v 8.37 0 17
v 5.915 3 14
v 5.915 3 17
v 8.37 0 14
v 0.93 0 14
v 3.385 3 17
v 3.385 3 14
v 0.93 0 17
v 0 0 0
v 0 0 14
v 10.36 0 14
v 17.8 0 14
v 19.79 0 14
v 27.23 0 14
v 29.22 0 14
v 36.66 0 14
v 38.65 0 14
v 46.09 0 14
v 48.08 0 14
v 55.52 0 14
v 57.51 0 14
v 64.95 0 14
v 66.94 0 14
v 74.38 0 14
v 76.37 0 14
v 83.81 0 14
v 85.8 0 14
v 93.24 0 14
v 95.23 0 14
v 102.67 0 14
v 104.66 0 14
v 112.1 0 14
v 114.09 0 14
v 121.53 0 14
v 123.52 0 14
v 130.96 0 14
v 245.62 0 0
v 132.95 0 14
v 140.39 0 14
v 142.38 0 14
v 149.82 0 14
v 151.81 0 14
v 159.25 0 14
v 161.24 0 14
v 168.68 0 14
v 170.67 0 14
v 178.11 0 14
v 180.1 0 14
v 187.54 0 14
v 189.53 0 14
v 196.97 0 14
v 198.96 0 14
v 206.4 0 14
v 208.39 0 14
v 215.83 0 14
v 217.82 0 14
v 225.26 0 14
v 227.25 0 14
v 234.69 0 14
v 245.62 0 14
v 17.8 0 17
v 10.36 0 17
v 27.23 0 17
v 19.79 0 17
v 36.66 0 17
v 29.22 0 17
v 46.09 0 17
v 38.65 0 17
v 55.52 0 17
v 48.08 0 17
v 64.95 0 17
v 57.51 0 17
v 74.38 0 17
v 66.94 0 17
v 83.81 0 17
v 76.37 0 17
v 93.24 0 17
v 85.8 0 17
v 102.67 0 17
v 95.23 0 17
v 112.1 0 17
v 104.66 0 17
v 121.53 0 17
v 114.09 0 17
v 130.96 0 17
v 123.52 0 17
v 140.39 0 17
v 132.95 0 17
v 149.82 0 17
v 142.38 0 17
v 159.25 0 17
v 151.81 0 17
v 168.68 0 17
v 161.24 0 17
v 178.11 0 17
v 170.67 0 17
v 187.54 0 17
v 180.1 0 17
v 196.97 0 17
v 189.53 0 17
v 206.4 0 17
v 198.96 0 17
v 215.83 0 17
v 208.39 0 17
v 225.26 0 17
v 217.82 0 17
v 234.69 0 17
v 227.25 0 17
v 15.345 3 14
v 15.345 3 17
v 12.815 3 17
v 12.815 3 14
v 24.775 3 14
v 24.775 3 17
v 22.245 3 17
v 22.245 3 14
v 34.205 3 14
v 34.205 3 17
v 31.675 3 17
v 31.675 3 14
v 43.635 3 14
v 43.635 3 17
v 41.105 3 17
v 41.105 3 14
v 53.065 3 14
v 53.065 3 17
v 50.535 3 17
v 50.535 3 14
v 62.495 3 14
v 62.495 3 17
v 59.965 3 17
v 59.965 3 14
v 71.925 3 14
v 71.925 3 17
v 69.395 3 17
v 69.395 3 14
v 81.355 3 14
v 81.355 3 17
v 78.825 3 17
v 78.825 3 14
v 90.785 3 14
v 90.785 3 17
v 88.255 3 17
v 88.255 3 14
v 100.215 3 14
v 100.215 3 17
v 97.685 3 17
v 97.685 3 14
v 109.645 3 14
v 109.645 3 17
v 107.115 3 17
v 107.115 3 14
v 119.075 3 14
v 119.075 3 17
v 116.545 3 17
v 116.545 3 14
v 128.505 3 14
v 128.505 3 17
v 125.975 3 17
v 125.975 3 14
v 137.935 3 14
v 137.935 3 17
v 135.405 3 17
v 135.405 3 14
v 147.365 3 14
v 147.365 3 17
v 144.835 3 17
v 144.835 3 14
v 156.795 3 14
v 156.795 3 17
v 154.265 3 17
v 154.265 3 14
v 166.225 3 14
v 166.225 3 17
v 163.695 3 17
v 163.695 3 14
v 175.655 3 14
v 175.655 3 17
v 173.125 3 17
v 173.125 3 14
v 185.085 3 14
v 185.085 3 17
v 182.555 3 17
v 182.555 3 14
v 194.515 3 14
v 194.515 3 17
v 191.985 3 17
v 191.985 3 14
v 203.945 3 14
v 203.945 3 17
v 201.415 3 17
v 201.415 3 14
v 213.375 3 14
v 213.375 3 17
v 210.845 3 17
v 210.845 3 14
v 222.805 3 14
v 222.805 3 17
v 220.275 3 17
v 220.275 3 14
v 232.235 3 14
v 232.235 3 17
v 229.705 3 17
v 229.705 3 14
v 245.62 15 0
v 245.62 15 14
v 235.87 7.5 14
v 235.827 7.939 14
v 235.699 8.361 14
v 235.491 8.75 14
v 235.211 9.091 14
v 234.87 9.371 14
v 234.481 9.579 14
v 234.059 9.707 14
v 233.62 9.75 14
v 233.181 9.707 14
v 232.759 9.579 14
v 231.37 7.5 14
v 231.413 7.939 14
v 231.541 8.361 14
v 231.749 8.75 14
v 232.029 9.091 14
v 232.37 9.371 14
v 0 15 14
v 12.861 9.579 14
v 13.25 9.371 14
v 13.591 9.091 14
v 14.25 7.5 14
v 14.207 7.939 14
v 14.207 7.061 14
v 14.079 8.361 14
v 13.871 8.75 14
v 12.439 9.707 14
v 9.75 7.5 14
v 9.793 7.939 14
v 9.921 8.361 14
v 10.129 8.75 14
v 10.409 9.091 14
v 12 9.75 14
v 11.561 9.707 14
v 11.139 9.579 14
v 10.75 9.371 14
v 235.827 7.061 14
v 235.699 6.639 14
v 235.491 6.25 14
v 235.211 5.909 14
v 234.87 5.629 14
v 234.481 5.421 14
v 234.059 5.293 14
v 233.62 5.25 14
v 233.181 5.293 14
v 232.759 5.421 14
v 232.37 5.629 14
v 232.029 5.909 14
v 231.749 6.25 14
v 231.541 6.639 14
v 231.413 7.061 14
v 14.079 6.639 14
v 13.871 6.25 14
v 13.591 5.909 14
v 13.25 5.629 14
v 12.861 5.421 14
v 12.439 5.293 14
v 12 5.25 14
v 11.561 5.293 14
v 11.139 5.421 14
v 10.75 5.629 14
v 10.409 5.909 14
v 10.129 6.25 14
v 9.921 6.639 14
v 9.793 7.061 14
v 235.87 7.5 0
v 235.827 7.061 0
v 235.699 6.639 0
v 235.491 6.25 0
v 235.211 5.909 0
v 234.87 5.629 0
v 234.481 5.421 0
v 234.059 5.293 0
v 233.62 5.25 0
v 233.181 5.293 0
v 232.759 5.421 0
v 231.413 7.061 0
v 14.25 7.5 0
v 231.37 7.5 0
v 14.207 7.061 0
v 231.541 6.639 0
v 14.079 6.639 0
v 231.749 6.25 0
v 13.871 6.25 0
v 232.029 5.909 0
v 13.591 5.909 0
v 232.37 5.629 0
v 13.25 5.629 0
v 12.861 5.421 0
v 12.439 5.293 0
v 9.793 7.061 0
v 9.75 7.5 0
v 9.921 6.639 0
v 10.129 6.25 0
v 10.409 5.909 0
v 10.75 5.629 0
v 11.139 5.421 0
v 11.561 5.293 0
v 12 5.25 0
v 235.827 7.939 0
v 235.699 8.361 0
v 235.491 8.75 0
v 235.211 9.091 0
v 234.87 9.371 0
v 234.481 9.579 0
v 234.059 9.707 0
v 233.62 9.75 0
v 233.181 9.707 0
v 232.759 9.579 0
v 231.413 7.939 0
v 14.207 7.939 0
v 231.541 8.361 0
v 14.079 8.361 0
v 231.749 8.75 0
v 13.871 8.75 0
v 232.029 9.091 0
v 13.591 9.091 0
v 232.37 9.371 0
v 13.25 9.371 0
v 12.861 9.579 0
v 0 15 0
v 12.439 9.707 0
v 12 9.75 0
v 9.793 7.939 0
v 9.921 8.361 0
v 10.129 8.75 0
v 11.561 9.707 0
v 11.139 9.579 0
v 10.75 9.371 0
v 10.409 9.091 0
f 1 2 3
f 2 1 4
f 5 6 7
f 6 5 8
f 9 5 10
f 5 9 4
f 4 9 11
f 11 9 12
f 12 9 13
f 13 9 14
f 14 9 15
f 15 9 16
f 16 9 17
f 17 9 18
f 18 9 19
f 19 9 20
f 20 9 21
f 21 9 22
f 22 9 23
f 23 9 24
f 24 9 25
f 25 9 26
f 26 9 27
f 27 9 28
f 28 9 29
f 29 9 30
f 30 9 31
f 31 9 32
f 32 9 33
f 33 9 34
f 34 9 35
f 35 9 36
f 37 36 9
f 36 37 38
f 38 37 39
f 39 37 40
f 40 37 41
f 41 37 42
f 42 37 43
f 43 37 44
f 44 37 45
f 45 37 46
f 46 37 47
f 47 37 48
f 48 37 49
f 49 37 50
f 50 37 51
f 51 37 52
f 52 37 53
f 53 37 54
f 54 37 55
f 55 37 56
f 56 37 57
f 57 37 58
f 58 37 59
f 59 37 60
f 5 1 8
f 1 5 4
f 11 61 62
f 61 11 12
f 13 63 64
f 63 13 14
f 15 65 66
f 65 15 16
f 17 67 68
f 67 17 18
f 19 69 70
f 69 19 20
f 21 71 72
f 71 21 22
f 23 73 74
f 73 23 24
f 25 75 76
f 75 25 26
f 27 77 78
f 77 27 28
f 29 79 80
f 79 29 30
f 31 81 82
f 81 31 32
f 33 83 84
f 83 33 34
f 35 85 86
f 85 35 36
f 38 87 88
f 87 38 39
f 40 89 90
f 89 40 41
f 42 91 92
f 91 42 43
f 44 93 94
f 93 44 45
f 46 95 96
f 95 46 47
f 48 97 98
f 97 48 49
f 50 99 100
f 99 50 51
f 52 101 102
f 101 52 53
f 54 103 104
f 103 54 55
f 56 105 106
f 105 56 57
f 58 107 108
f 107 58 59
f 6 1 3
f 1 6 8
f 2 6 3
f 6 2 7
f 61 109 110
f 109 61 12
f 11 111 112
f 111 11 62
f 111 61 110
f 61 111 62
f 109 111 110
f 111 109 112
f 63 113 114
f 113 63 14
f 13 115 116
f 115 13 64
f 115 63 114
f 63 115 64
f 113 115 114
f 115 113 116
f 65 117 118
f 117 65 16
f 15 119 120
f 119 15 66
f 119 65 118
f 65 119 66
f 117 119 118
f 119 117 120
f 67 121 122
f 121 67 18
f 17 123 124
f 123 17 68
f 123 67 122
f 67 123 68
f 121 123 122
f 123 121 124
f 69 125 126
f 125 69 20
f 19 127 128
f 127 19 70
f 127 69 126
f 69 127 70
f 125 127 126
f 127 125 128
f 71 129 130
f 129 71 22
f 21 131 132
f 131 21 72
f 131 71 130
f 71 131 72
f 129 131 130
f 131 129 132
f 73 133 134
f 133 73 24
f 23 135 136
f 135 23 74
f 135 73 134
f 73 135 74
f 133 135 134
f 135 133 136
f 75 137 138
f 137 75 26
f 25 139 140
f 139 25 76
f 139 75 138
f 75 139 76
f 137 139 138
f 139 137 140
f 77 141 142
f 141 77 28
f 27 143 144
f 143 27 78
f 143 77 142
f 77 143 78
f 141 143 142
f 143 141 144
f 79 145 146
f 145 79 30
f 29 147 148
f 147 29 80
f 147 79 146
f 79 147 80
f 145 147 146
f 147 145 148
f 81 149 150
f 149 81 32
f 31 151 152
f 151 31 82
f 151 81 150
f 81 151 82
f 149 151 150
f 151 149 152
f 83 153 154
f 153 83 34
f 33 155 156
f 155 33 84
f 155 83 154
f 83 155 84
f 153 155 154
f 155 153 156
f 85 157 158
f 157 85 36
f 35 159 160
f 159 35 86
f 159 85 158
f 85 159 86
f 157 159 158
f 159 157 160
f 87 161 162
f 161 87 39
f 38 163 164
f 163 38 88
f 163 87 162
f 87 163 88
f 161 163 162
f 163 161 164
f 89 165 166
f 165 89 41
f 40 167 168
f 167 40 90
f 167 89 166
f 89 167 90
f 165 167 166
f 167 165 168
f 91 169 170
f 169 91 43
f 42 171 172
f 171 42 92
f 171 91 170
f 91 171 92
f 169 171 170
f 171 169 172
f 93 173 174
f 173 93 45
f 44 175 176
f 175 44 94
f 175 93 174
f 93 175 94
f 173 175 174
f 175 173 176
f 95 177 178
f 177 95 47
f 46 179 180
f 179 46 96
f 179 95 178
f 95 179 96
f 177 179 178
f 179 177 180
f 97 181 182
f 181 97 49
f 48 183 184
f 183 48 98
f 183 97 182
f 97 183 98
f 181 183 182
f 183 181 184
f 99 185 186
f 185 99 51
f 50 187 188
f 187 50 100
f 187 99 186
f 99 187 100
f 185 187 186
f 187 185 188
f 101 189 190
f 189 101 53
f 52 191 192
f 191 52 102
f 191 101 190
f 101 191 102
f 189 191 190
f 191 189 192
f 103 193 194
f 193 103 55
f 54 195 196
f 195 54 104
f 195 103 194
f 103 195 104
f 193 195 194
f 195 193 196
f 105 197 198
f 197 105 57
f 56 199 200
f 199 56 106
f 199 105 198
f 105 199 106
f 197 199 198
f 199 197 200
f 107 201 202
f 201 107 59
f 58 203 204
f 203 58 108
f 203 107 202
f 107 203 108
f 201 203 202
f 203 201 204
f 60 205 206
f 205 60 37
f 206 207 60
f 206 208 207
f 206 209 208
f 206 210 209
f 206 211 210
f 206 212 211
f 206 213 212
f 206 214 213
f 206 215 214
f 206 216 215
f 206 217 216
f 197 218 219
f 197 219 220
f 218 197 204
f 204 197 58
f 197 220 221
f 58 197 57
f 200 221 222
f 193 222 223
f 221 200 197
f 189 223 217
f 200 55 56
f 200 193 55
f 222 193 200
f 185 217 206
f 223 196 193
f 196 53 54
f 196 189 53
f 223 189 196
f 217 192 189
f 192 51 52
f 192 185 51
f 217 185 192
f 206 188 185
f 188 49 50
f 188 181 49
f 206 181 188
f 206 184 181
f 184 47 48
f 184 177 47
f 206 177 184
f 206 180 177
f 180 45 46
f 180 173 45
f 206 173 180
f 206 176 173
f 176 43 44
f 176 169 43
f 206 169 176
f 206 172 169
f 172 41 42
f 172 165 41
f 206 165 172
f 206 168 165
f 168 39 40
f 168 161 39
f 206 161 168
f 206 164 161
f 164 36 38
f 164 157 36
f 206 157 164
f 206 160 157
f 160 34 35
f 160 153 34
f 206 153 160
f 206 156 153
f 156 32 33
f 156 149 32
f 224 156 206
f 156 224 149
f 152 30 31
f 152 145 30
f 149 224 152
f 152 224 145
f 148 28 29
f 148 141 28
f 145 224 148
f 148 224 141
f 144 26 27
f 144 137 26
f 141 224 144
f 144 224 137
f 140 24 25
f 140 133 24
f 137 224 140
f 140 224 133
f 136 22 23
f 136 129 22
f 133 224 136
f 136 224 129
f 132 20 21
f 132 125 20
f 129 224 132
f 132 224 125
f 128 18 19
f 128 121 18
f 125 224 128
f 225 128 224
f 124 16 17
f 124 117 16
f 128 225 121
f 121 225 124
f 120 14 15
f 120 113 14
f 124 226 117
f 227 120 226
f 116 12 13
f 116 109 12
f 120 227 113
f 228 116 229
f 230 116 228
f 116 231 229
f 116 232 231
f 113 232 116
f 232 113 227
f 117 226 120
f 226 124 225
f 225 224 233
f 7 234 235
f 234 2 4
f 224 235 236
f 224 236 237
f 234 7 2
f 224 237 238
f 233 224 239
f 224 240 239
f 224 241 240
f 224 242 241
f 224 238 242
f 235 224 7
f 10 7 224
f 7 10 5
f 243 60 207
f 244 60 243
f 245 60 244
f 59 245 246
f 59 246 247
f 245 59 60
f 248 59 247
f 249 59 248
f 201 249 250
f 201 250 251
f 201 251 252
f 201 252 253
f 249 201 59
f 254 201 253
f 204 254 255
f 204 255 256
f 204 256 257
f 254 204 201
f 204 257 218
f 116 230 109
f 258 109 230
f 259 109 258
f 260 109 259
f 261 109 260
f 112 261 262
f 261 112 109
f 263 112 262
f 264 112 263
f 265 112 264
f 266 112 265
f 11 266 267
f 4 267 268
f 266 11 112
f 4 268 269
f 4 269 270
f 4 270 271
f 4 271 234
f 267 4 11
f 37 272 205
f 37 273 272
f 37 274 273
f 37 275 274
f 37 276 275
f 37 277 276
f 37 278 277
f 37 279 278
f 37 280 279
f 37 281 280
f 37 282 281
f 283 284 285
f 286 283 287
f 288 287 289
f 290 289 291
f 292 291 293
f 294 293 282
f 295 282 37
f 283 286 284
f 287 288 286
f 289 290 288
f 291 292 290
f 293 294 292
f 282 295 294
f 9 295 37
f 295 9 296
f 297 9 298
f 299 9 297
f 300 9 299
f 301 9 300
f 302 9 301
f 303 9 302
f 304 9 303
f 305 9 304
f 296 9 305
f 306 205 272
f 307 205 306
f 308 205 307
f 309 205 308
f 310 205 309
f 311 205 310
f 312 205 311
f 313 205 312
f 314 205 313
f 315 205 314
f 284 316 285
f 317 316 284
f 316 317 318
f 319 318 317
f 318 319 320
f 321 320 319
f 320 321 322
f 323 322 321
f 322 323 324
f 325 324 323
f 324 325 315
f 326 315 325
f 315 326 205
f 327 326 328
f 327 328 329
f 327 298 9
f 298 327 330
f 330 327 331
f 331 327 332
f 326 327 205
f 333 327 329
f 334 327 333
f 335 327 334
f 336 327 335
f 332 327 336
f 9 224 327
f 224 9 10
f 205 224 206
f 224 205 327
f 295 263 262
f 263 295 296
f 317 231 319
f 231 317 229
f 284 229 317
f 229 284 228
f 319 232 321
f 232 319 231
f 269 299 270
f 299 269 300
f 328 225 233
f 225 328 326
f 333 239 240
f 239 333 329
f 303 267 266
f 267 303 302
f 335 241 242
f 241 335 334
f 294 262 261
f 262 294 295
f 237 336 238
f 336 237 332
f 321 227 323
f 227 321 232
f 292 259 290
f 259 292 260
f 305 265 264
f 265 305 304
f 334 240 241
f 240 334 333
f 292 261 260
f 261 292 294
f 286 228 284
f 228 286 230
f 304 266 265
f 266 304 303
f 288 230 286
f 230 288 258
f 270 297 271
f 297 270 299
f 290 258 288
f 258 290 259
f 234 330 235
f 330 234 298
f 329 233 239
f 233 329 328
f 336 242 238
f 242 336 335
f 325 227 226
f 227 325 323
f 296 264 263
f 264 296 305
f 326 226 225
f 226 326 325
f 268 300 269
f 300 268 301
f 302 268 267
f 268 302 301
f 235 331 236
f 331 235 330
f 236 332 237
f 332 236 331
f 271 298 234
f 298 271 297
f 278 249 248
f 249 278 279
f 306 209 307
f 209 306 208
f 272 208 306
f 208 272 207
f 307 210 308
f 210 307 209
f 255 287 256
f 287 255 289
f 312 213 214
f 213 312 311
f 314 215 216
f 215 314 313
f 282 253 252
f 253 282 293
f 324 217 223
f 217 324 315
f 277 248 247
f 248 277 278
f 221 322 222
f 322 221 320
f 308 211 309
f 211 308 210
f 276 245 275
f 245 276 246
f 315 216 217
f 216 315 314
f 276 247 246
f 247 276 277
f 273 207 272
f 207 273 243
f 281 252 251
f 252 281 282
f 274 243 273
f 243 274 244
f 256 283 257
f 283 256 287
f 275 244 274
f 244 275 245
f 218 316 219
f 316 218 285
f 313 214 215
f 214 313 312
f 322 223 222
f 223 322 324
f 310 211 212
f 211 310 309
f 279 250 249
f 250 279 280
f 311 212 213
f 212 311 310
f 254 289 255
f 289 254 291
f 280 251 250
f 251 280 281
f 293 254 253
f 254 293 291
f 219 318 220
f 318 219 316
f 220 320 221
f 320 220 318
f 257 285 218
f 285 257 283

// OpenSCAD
$fn = 32;

// ----------------------------------------------------------------------
// Gear rack: m=3 z=25, 245.62 x 15 x 17 mm
// ----------------------------------------------------------------------

// --- parameters (mm) ---
bar_len = 245.62;         // rack length, X
bar_w = 15;               // rack width, Y
bar_h = 17;               // overall height, Z
gear_module = 3;          // module
base_t = 14;              // tooth root line height
pitch = 9.43;             // circular pitch
tip_w = 2.53;             // tooth thickness at the tip
root_w = 7.44;            // tooth thickness at the root line
hole_d = 4.5;             // mounting hole
sink = 0.6;               // tooth root overlap into the body

tooth_span = 235.62;

module tooth(x0) {
  /* 20 deg flank profile, sunk into the body for a positive overlap */
  translate([x0, 0, base_t - sink])
    linear_extrude(height = bar_h - base_t + sink)
      polygon(points = [[-root_w / 2, 0], [root_w / 2, 0],
                        [tip_w / 2, bar_h - base_t],
                        [-tip_w / 2, bar_h - base_t]]);
}

difference() {
  union() {
    cube([bar_len, bar_w, base_t]);
    for (i = [0 : 25 - 1])
      tooth((i + 0.5) * pitch + (tooth_span - 25 * pitch) / 2);
  }
  translate([12, 7.5, -1]) cylinder(h = base_t + 2, d = hole_d);
  translate([233.62, 7.5, -1]) cylinder(h = base_t + 2, d = hole_d);
}
